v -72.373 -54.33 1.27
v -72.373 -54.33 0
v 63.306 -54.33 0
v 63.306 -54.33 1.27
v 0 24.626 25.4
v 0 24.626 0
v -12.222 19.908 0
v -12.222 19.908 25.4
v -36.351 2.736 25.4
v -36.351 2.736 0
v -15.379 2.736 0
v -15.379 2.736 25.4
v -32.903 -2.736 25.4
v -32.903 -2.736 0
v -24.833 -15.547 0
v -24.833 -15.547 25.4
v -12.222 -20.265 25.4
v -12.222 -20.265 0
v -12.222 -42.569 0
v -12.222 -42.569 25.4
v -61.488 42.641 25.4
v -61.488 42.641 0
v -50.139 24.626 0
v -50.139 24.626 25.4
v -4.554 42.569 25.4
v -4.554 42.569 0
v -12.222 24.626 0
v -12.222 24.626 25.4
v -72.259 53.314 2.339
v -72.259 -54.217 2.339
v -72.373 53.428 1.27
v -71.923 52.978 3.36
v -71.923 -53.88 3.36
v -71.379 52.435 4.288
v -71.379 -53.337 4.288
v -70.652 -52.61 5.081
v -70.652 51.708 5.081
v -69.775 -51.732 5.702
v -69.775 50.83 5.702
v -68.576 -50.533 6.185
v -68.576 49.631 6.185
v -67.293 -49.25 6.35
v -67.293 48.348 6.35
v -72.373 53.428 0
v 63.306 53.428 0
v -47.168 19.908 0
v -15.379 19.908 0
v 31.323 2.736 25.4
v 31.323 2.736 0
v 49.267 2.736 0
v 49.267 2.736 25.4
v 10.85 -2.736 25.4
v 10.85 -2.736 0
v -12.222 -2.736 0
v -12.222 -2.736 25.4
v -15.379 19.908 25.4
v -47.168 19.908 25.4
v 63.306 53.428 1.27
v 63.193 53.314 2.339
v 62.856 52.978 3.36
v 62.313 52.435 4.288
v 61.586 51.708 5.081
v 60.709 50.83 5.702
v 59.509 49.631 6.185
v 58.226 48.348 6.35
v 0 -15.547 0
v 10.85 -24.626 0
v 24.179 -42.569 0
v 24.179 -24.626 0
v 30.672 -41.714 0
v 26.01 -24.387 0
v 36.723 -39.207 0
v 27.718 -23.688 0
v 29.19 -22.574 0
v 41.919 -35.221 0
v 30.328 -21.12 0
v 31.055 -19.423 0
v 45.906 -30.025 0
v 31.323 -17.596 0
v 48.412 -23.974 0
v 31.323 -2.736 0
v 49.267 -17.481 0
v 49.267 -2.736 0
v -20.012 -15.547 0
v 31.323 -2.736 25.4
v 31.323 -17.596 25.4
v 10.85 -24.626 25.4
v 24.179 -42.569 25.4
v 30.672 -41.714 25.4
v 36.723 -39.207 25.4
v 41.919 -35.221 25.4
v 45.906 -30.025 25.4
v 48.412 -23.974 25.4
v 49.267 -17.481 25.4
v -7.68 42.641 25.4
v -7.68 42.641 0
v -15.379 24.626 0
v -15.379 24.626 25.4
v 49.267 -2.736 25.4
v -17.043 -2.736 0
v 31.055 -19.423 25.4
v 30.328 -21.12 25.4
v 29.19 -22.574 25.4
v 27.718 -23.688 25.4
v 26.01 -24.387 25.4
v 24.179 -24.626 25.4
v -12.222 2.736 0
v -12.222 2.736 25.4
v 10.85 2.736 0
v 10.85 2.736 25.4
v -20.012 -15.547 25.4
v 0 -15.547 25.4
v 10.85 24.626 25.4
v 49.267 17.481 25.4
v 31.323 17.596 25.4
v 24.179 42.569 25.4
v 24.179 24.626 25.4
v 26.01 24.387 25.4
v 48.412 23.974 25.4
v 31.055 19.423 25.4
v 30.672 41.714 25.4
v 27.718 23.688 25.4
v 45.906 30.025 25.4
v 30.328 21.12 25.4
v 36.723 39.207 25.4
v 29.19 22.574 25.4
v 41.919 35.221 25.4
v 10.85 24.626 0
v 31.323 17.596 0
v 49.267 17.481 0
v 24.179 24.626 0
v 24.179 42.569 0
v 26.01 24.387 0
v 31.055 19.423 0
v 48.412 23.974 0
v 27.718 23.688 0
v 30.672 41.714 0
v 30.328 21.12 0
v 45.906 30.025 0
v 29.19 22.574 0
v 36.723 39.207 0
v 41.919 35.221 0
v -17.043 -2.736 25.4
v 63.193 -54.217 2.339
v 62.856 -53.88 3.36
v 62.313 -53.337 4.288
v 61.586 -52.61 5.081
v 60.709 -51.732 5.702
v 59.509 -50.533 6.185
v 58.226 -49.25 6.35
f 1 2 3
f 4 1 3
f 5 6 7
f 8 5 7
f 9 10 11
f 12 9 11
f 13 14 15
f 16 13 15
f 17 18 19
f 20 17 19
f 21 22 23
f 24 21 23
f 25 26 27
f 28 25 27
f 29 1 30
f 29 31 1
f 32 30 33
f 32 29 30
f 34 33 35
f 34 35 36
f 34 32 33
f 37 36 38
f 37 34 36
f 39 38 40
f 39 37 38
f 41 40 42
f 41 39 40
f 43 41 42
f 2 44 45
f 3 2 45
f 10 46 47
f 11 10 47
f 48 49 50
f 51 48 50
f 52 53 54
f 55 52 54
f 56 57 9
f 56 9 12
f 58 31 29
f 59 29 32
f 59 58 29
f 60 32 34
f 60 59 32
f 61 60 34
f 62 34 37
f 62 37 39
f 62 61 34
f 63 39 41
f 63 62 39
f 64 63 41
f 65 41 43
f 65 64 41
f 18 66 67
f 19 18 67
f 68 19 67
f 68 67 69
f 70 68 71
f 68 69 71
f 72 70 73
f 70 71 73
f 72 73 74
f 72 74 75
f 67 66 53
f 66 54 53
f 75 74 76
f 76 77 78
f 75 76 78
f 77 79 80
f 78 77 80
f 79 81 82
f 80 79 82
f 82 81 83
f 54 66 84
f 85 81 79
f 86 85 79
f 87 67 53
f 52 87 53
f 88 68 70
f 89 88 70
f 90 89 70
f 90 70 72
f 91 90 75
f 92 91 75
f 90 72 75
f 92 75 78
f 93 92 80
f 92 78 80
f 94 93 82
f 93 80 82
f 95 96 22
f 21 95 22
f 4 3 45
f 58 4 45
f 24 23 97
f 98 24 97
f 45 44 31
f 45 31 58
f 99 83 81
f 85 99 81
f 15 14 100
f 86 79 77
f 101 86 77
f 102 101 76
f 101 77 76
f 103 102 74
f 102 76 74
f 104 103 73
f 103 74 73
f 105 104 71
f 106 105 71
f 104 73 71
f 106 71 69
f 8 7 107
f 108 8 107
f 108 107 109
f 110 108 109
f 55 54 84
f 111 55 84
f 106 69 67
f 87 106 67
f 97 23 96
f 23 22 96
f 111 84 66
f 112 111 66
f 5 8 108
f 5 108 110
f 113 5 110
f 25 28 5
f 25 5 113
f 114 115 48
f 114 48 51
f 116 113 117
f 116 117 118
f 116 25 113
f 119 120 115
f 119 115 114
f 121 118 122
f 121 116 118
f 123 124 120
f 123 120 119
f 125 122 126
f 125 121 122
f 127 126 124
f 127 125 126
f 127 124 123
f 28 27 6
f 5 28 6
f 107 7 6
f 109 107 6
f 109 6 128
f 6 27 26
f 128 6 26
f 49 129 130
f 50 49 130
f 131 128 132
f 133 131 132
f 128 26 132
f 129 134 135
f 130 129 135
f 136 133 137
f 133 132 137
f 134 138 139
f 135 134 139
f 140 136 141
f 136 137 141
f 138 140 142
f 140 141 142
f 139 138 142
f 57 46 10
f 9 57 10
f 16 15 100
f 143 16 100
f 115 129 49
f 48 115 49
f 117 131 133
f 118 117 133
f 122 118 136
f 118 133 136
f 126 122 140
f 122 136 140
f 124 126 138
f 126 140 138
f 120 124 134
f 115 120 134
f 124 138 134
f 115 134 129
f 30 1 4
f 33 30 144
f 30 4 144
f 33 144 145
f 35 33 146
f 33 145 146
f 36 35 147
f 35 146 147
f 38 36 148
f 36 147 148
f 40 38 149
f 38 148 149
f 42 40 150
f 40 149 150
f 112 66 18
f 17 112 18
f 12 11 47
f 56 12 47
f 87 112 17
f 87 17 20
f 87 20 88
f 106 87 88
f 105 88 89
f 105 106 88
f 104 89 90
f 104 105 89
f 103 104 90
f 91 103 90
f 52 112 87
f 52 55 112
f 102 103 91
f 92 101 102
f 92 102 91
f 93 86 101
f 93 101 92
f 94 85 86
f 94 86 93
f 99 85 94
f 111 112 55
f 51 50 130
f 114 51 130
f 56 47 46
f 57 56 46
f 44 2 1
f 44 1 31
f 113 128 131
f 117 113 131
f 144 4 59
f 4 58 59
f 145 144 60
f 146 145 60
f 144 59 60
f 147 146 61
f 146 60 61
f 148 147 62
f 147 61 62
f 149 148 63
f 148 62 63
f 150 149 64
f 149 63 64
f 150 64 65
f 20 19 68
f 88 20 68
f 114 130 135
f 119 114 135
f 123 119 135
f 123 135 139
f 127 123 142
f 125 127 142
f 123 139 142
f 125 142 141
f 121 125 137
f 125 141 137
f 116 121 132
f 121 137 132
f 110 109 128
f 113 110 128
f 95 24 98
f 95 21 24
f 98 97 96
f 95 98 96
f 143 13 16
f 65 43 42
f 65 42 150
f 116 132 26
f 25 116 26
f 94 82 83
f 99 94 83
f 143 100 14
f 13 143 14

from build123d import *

# Parameters (mm, degrees)
F1_DEPTH = 25.4
F2_W     = 135.679178
F2_H     = 107.758593
F3_DEPTH = 6.35
F4_R     = 5.08


with BuildPart() as f1:
    # F0 (on Top) → F1 (new body)
    with BuildSketch(Plane.XY):
        Polygon((-47.167739, 19.908149), (-36.350581, 2.736191), (-15.379281, 2.736191), (-15.379281, 19.908149), align=None)
        with BuildLine():
            Line((24.179354, 42.568505), (-4.554338, 42.568505))
            Line((-4.554338, 42.568505), (-12.222076, 24.625719))
            Line((-12.222076, 24.625719), (0, 24.625719))
            Line((0, 24.625719), (-12.222076, 19.908149))
            Line((-12.222076, 19.908149), (-12.222076, 2.736191))
            Line((-12.222076, 2.736191), (10.850413, 2.736191))
            Line((10.850413, 2.736191), (10.850413, 24.625719))
            Line((10.850413, 24.625719), (24.179354, 24.625719))
            ThreePointArc((24.179354, 24.625719), (29.190455, 22.573685), (31.323036, 17.596329))
            Line((31.323036, 17.596329), (31.323036, 2.736191))
            Line((31.323036, 2.736191), (49.266752, 2.736191))
            Line((49.266752, 2.736191), (49.266752, 17.481107))
            ThreePointArc((49.266752, 17.481107), (41.918823, 35.220576), (24.179354, 42.568505))
        make_face()
        with BuildLine():
            Line((10.850413, -2.736191), (-12.222076, -2.736191))
            Line((-12.222076, -2.736191), (-20.012174, -15.547398))
            Line((-20.012174, -15.547398), (0, -15.547398))
            Line((0, -15.547398), (-12.222076, -20.264968))
            Line((-12.222076, -20.264968), (-12.222076, -42.568505))
            Line((-12.222076, -42.568505), (-4.554338, -42.568505))
            Line((-4.554338, -42.568505), (24.179354, -42.568505))
            ThreePointArc((24.179354, -42.568505), (41.918823, -35.220576), (49.266752, -17.481107))
            Line((49.266752, -17.481107), (49.266752, -2.736191))
            Line((49.266752, -2.736191), (31.323036, -2.736191))
            Line((31.323036, -2.736191), (31.323036, -17.596329))
            ThreePointArc((31.323036, -17.596329), (29.190455, -22.573685), (24.179354, -24.625719))
            Line((24.179354, -24.625719), (10.850413, -24.625719))
            Line((10.850413, -24.625719), (10.850413, -2.736191))
        make_face()
        Polygon((-50.139485, 24.625719), (-15.379281, 24.625719), (-7.680428, 42.641316), (-61.488077, 42.641316), align=None)
        Polygon((-32.903355, -2.736191), (-24.833172, -15.547398), (-17.043074, -2.736191), align=None)
    extrude(amount=F1_DEPTH)


with BuildPart() as f3:
    # F2 (on Top) → F3 (new body)
    with BuildSketch(Plane.XY):
        with Locations((-4.533257, -0.451007)):
            Rectangle(F2_W, F2_H)
    extrude(amount=F3_DEPTH)

    # F4
    f4_edges = [f3.edges().sort_by_distance(p)[0] for p in [
        (-4.533257, 53.428289, 6.35),
        (-72.372846, -0.451008, 6.35),
        (63.306332, -0.451008, 6.35),
        (-4.533257, -54.330304, 6.35),
    ]]
    fillet(f4_edges, radius=F4_R)


solid = Compound([f1.part, f3.part])
